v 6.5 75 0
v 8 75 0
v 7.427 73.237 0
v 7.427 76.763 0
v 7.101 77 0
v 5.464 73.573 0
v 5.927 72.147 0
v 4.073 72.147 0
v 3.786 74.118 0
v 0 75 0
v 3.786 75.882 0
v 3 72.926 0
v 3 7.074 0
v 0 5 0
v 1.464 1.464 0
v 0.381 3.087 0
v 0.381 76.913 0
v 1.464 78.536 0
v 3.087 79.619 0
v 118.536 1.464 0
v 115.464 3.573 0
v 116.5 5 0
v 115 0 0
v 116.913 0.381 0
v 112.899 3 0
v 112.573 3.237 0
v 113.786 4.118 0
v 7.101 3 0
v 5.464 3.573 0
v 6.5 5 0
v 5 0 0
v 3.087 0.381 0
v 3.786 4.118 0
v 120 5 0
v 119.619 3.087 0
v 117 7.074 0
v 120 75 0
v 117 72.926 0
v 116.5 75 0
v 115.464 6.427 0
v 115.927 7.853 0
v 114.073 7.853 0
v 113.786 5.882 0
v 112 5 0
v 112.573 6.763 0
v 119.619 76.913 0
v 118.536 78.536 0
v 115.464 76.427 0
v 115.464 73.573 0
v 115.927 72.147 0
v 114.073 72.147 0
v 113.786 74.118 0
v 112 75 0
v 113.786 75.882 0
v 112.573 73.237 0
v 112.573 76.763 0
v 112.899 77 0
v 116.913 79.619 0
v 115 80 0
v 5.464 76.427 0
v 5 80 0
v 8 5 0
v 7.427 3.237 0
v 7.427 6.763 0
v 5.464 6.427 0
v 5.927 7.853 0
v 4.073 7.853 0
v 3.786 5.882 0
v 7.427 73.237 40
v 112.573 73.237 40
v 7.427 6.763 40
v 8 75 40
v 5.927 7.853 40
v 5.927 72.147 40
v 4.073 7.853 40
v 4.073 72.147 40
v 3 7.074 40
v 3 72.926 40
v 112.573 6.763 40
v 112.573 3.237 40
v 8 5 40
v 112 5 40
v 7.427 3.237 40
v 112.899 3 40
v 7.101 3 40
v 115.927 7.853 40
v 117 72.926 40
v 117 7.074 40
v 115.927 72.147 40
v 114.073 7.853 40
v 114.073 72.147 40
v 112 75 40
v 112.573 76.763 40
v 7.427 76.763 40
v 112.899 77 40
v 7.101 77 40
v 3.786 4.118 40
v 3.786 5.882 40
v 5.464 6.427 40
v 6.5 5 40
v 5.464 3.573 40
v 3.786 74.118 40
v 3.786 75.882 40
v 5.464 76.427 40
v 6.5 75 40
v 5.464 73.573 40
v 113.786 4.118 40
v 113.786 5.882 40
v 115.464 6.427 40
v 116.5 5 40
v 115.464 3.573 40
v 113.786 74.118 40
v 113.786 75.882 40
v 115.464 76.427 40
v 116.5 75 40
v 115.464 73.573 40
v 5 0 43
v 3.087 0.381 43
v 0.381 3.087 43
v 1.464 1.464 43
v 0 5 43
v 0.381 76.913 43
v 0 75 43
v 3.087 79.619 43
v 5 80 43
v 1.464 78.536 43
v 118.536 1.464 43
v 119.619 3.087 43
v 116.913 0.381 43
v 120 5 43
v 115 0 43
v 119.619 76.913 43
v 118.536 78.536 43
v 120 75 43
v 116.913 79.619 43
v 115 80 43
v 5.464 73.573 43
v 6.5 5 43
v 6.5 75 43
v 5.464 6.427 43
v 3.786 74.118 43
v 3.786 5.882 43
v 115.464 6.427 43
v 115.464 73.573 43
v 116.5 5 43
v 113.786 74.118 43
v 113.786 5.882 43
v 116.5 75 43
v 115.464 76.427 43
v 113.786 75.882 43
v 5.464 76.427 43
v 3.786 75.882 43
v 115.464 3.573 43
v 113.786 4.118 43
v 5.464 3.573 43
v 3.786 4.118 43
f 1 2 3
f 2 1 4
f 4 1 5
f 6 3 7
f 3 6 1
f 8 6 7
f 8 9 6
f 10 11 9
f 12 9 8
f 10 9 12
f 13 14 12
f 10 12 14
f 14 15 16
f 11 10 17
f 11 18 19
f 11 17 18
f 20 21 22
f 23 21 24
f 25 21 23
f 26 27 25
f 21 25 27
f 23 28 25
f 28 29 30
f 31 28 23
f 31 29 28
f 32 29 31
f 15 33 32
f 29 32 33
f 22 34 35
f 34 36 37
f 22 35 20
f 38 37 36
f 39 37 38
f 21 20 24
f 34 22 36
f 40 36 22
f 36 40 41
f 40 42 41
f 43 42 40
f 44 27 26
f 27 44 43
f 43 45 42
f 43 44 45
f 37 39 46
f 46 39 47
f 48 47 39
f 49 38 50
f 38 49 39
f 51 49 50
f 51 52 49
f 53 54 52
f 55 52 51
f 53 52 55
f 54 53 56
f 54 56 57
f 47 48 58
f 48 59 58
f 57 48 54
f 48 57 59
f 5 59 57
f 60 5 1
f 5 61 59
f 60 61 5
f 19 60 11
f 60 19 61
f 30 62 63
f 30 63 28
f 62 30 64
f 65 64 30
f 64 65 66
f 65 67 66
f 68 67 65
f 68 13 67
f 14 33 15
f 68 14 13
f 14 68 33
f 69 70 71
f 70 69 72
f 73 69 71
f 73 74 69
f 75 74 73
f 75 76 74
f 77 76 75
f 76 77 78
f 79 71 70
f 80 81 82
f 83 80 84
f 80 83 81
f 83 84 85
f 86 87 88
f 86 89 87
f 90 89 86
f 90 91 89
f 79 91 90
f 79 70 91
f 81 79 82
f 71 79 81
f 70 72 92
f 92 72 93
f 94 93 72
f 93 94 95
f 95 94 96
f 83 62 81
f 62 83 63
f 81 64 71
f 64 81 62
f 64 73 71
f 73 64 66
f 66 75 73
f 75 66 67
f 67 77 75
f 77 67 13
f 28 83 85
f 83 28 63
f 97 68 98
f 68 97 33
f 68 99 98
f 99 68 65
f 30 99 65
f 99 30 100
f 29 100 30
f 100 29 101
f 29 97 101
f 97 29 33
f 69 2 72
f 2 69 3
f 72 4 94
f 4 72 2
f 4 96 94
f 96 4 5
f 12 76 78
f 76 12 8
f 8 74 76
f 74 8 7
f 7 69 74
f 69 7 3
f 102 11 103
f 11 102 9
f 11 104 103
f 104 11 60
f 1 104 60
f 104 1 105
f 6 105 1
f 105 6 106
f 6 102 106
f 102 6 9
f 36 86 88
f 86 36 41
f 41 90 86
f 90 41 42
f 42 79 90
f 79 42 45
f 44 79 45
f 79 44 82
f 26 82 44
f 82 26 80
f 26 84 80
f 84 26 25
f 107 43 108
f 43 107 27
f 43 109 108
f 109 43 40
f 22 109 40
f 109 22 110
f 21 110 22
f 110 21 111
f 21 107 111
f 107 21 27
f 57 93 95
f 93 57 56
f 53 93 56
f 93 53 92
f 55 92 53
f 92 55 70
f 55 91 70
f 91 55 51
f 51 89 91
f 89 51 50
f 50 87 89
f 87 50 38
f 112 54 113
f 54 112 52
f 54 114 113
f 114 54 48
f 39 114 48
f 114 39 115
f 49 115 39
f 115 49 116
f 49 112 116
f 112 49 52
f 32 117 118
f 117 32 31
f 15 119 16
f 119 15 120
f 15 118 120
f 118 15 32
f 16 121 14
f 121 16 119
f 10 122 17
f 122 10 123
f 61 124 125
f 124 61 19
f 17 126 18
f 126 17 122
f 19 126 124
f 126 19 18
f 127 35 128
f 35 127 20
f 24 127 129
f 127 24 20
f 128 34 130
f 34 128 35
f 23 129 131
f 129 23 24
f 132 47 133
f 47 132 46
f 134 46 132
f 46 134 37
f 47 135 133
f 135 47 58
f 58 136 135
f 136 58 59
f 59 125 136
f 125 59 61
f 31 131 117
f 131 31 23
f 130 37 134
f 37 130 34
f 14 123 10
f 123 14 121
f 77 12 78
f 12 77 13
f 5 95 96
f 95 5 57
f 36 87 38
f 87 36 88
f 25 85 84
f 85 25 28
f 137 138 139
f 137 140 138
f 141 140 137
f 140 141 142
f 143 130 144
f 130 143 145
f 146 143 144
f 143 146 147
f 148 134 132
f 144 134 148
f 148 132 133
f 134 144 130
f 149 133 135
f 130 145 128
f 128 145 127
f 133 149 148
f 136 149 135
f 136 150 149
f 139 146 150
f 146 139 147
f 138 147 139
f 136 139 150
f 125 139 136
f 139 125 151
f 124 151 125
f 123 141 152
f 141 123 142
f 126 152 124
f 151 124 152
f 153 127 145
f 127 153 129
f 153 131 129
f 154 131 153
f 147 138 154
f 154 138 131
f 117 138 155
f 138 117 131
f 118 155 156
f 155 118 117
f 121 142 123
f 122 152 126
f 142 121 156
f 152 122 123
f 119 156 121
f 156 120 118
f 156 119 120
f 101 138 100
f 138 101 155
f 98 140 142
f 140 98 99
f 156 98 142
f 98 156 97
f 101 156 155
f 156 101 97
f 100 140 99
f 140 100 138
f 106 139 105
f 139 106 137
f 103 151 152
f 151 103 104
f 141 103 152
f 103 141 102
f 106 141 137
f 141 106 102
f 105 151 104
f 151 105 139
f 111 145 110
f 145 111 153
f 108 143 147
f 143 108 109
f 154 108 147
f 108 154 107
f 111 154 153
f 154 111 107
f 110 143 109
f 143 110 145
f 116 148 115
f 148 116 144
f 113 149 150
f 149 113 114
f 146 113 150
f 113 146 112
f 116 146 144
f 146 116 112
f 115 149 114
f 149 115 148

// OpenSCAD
use <MCAD/boxes.scad>

// Choose Part
part = "3"; // [1:Case Only,2:Cover Plate Only,3:Both]

// Width of the case
width = 120;

// Depth of the case
depth = 80;

// Height of the case
height = 40;

// Material thickness of the case and plates
material_thickness = 3;

// Corner radius of rounded corners
corner_radius = 5;

// Hole offset
hole_offset = 5; //[1:14]

// Hole diameter
hole_diameter = 3;

print_part();

module print_part() {
	if (part == "1") {
		base();
	} else if (part == "2") {
		plate();
	} else if (part == "3") {
		both();
	} else {
		both();
	}
}

module both(){
	base();
	translate([0,0,height])
		plate();
}

module base(){
	// All dimensions in mm
	x = width;
	y = depth;
	z = height;

	union(){
		for (i=[ [hole_offset,hole_offset, 0],
				[hole_offset,y-hole_offset, 0],
				[x-hole_offset,hole_offset, 0],
				[x-hole_offset,y-hole_offset, 0] ])
			{
			translate(i){
				linear_extrude(height=z){
					difference(){
						circle(r=(hole_diameter));
						circle(r=(hole_diameter/2));
					}
				}
			}
		}
		difference(){
			translate([x/2, y/2, height/2]){
			  roundedBox([x, y, height], 5, true);
			}
			translate([material_thickness, material_thickness, 0]) {
				linear_extrude(height=z)
				square(size = [x-(material_thickness*2), y-(material_thickness*2)], center = false);
		   	}
		}
	}
}


module plate(){
	// All dimensions in mm
	x = width;
	y = depth;
	z = material_thickness;

	difference() {
		// create the base
		translate([x/2, y/2, z/2]){
		  roundedBox([x, y, z], corner_radius, true);
		}
		// Create 4 holes
		for (i = [ [hole_offset,hole_offset, -10],
			[hole_offset,y-hole_offset, -10],
			[x-hole_offset,hole_offset, -10],
			[x-hole_offset,y-hole_offset, -10] ])
		{
			translate(i) {
				linear_extrude(height = z + 10)
				circle(r=(hole_diameter/2));
			}
		}
	}
}
